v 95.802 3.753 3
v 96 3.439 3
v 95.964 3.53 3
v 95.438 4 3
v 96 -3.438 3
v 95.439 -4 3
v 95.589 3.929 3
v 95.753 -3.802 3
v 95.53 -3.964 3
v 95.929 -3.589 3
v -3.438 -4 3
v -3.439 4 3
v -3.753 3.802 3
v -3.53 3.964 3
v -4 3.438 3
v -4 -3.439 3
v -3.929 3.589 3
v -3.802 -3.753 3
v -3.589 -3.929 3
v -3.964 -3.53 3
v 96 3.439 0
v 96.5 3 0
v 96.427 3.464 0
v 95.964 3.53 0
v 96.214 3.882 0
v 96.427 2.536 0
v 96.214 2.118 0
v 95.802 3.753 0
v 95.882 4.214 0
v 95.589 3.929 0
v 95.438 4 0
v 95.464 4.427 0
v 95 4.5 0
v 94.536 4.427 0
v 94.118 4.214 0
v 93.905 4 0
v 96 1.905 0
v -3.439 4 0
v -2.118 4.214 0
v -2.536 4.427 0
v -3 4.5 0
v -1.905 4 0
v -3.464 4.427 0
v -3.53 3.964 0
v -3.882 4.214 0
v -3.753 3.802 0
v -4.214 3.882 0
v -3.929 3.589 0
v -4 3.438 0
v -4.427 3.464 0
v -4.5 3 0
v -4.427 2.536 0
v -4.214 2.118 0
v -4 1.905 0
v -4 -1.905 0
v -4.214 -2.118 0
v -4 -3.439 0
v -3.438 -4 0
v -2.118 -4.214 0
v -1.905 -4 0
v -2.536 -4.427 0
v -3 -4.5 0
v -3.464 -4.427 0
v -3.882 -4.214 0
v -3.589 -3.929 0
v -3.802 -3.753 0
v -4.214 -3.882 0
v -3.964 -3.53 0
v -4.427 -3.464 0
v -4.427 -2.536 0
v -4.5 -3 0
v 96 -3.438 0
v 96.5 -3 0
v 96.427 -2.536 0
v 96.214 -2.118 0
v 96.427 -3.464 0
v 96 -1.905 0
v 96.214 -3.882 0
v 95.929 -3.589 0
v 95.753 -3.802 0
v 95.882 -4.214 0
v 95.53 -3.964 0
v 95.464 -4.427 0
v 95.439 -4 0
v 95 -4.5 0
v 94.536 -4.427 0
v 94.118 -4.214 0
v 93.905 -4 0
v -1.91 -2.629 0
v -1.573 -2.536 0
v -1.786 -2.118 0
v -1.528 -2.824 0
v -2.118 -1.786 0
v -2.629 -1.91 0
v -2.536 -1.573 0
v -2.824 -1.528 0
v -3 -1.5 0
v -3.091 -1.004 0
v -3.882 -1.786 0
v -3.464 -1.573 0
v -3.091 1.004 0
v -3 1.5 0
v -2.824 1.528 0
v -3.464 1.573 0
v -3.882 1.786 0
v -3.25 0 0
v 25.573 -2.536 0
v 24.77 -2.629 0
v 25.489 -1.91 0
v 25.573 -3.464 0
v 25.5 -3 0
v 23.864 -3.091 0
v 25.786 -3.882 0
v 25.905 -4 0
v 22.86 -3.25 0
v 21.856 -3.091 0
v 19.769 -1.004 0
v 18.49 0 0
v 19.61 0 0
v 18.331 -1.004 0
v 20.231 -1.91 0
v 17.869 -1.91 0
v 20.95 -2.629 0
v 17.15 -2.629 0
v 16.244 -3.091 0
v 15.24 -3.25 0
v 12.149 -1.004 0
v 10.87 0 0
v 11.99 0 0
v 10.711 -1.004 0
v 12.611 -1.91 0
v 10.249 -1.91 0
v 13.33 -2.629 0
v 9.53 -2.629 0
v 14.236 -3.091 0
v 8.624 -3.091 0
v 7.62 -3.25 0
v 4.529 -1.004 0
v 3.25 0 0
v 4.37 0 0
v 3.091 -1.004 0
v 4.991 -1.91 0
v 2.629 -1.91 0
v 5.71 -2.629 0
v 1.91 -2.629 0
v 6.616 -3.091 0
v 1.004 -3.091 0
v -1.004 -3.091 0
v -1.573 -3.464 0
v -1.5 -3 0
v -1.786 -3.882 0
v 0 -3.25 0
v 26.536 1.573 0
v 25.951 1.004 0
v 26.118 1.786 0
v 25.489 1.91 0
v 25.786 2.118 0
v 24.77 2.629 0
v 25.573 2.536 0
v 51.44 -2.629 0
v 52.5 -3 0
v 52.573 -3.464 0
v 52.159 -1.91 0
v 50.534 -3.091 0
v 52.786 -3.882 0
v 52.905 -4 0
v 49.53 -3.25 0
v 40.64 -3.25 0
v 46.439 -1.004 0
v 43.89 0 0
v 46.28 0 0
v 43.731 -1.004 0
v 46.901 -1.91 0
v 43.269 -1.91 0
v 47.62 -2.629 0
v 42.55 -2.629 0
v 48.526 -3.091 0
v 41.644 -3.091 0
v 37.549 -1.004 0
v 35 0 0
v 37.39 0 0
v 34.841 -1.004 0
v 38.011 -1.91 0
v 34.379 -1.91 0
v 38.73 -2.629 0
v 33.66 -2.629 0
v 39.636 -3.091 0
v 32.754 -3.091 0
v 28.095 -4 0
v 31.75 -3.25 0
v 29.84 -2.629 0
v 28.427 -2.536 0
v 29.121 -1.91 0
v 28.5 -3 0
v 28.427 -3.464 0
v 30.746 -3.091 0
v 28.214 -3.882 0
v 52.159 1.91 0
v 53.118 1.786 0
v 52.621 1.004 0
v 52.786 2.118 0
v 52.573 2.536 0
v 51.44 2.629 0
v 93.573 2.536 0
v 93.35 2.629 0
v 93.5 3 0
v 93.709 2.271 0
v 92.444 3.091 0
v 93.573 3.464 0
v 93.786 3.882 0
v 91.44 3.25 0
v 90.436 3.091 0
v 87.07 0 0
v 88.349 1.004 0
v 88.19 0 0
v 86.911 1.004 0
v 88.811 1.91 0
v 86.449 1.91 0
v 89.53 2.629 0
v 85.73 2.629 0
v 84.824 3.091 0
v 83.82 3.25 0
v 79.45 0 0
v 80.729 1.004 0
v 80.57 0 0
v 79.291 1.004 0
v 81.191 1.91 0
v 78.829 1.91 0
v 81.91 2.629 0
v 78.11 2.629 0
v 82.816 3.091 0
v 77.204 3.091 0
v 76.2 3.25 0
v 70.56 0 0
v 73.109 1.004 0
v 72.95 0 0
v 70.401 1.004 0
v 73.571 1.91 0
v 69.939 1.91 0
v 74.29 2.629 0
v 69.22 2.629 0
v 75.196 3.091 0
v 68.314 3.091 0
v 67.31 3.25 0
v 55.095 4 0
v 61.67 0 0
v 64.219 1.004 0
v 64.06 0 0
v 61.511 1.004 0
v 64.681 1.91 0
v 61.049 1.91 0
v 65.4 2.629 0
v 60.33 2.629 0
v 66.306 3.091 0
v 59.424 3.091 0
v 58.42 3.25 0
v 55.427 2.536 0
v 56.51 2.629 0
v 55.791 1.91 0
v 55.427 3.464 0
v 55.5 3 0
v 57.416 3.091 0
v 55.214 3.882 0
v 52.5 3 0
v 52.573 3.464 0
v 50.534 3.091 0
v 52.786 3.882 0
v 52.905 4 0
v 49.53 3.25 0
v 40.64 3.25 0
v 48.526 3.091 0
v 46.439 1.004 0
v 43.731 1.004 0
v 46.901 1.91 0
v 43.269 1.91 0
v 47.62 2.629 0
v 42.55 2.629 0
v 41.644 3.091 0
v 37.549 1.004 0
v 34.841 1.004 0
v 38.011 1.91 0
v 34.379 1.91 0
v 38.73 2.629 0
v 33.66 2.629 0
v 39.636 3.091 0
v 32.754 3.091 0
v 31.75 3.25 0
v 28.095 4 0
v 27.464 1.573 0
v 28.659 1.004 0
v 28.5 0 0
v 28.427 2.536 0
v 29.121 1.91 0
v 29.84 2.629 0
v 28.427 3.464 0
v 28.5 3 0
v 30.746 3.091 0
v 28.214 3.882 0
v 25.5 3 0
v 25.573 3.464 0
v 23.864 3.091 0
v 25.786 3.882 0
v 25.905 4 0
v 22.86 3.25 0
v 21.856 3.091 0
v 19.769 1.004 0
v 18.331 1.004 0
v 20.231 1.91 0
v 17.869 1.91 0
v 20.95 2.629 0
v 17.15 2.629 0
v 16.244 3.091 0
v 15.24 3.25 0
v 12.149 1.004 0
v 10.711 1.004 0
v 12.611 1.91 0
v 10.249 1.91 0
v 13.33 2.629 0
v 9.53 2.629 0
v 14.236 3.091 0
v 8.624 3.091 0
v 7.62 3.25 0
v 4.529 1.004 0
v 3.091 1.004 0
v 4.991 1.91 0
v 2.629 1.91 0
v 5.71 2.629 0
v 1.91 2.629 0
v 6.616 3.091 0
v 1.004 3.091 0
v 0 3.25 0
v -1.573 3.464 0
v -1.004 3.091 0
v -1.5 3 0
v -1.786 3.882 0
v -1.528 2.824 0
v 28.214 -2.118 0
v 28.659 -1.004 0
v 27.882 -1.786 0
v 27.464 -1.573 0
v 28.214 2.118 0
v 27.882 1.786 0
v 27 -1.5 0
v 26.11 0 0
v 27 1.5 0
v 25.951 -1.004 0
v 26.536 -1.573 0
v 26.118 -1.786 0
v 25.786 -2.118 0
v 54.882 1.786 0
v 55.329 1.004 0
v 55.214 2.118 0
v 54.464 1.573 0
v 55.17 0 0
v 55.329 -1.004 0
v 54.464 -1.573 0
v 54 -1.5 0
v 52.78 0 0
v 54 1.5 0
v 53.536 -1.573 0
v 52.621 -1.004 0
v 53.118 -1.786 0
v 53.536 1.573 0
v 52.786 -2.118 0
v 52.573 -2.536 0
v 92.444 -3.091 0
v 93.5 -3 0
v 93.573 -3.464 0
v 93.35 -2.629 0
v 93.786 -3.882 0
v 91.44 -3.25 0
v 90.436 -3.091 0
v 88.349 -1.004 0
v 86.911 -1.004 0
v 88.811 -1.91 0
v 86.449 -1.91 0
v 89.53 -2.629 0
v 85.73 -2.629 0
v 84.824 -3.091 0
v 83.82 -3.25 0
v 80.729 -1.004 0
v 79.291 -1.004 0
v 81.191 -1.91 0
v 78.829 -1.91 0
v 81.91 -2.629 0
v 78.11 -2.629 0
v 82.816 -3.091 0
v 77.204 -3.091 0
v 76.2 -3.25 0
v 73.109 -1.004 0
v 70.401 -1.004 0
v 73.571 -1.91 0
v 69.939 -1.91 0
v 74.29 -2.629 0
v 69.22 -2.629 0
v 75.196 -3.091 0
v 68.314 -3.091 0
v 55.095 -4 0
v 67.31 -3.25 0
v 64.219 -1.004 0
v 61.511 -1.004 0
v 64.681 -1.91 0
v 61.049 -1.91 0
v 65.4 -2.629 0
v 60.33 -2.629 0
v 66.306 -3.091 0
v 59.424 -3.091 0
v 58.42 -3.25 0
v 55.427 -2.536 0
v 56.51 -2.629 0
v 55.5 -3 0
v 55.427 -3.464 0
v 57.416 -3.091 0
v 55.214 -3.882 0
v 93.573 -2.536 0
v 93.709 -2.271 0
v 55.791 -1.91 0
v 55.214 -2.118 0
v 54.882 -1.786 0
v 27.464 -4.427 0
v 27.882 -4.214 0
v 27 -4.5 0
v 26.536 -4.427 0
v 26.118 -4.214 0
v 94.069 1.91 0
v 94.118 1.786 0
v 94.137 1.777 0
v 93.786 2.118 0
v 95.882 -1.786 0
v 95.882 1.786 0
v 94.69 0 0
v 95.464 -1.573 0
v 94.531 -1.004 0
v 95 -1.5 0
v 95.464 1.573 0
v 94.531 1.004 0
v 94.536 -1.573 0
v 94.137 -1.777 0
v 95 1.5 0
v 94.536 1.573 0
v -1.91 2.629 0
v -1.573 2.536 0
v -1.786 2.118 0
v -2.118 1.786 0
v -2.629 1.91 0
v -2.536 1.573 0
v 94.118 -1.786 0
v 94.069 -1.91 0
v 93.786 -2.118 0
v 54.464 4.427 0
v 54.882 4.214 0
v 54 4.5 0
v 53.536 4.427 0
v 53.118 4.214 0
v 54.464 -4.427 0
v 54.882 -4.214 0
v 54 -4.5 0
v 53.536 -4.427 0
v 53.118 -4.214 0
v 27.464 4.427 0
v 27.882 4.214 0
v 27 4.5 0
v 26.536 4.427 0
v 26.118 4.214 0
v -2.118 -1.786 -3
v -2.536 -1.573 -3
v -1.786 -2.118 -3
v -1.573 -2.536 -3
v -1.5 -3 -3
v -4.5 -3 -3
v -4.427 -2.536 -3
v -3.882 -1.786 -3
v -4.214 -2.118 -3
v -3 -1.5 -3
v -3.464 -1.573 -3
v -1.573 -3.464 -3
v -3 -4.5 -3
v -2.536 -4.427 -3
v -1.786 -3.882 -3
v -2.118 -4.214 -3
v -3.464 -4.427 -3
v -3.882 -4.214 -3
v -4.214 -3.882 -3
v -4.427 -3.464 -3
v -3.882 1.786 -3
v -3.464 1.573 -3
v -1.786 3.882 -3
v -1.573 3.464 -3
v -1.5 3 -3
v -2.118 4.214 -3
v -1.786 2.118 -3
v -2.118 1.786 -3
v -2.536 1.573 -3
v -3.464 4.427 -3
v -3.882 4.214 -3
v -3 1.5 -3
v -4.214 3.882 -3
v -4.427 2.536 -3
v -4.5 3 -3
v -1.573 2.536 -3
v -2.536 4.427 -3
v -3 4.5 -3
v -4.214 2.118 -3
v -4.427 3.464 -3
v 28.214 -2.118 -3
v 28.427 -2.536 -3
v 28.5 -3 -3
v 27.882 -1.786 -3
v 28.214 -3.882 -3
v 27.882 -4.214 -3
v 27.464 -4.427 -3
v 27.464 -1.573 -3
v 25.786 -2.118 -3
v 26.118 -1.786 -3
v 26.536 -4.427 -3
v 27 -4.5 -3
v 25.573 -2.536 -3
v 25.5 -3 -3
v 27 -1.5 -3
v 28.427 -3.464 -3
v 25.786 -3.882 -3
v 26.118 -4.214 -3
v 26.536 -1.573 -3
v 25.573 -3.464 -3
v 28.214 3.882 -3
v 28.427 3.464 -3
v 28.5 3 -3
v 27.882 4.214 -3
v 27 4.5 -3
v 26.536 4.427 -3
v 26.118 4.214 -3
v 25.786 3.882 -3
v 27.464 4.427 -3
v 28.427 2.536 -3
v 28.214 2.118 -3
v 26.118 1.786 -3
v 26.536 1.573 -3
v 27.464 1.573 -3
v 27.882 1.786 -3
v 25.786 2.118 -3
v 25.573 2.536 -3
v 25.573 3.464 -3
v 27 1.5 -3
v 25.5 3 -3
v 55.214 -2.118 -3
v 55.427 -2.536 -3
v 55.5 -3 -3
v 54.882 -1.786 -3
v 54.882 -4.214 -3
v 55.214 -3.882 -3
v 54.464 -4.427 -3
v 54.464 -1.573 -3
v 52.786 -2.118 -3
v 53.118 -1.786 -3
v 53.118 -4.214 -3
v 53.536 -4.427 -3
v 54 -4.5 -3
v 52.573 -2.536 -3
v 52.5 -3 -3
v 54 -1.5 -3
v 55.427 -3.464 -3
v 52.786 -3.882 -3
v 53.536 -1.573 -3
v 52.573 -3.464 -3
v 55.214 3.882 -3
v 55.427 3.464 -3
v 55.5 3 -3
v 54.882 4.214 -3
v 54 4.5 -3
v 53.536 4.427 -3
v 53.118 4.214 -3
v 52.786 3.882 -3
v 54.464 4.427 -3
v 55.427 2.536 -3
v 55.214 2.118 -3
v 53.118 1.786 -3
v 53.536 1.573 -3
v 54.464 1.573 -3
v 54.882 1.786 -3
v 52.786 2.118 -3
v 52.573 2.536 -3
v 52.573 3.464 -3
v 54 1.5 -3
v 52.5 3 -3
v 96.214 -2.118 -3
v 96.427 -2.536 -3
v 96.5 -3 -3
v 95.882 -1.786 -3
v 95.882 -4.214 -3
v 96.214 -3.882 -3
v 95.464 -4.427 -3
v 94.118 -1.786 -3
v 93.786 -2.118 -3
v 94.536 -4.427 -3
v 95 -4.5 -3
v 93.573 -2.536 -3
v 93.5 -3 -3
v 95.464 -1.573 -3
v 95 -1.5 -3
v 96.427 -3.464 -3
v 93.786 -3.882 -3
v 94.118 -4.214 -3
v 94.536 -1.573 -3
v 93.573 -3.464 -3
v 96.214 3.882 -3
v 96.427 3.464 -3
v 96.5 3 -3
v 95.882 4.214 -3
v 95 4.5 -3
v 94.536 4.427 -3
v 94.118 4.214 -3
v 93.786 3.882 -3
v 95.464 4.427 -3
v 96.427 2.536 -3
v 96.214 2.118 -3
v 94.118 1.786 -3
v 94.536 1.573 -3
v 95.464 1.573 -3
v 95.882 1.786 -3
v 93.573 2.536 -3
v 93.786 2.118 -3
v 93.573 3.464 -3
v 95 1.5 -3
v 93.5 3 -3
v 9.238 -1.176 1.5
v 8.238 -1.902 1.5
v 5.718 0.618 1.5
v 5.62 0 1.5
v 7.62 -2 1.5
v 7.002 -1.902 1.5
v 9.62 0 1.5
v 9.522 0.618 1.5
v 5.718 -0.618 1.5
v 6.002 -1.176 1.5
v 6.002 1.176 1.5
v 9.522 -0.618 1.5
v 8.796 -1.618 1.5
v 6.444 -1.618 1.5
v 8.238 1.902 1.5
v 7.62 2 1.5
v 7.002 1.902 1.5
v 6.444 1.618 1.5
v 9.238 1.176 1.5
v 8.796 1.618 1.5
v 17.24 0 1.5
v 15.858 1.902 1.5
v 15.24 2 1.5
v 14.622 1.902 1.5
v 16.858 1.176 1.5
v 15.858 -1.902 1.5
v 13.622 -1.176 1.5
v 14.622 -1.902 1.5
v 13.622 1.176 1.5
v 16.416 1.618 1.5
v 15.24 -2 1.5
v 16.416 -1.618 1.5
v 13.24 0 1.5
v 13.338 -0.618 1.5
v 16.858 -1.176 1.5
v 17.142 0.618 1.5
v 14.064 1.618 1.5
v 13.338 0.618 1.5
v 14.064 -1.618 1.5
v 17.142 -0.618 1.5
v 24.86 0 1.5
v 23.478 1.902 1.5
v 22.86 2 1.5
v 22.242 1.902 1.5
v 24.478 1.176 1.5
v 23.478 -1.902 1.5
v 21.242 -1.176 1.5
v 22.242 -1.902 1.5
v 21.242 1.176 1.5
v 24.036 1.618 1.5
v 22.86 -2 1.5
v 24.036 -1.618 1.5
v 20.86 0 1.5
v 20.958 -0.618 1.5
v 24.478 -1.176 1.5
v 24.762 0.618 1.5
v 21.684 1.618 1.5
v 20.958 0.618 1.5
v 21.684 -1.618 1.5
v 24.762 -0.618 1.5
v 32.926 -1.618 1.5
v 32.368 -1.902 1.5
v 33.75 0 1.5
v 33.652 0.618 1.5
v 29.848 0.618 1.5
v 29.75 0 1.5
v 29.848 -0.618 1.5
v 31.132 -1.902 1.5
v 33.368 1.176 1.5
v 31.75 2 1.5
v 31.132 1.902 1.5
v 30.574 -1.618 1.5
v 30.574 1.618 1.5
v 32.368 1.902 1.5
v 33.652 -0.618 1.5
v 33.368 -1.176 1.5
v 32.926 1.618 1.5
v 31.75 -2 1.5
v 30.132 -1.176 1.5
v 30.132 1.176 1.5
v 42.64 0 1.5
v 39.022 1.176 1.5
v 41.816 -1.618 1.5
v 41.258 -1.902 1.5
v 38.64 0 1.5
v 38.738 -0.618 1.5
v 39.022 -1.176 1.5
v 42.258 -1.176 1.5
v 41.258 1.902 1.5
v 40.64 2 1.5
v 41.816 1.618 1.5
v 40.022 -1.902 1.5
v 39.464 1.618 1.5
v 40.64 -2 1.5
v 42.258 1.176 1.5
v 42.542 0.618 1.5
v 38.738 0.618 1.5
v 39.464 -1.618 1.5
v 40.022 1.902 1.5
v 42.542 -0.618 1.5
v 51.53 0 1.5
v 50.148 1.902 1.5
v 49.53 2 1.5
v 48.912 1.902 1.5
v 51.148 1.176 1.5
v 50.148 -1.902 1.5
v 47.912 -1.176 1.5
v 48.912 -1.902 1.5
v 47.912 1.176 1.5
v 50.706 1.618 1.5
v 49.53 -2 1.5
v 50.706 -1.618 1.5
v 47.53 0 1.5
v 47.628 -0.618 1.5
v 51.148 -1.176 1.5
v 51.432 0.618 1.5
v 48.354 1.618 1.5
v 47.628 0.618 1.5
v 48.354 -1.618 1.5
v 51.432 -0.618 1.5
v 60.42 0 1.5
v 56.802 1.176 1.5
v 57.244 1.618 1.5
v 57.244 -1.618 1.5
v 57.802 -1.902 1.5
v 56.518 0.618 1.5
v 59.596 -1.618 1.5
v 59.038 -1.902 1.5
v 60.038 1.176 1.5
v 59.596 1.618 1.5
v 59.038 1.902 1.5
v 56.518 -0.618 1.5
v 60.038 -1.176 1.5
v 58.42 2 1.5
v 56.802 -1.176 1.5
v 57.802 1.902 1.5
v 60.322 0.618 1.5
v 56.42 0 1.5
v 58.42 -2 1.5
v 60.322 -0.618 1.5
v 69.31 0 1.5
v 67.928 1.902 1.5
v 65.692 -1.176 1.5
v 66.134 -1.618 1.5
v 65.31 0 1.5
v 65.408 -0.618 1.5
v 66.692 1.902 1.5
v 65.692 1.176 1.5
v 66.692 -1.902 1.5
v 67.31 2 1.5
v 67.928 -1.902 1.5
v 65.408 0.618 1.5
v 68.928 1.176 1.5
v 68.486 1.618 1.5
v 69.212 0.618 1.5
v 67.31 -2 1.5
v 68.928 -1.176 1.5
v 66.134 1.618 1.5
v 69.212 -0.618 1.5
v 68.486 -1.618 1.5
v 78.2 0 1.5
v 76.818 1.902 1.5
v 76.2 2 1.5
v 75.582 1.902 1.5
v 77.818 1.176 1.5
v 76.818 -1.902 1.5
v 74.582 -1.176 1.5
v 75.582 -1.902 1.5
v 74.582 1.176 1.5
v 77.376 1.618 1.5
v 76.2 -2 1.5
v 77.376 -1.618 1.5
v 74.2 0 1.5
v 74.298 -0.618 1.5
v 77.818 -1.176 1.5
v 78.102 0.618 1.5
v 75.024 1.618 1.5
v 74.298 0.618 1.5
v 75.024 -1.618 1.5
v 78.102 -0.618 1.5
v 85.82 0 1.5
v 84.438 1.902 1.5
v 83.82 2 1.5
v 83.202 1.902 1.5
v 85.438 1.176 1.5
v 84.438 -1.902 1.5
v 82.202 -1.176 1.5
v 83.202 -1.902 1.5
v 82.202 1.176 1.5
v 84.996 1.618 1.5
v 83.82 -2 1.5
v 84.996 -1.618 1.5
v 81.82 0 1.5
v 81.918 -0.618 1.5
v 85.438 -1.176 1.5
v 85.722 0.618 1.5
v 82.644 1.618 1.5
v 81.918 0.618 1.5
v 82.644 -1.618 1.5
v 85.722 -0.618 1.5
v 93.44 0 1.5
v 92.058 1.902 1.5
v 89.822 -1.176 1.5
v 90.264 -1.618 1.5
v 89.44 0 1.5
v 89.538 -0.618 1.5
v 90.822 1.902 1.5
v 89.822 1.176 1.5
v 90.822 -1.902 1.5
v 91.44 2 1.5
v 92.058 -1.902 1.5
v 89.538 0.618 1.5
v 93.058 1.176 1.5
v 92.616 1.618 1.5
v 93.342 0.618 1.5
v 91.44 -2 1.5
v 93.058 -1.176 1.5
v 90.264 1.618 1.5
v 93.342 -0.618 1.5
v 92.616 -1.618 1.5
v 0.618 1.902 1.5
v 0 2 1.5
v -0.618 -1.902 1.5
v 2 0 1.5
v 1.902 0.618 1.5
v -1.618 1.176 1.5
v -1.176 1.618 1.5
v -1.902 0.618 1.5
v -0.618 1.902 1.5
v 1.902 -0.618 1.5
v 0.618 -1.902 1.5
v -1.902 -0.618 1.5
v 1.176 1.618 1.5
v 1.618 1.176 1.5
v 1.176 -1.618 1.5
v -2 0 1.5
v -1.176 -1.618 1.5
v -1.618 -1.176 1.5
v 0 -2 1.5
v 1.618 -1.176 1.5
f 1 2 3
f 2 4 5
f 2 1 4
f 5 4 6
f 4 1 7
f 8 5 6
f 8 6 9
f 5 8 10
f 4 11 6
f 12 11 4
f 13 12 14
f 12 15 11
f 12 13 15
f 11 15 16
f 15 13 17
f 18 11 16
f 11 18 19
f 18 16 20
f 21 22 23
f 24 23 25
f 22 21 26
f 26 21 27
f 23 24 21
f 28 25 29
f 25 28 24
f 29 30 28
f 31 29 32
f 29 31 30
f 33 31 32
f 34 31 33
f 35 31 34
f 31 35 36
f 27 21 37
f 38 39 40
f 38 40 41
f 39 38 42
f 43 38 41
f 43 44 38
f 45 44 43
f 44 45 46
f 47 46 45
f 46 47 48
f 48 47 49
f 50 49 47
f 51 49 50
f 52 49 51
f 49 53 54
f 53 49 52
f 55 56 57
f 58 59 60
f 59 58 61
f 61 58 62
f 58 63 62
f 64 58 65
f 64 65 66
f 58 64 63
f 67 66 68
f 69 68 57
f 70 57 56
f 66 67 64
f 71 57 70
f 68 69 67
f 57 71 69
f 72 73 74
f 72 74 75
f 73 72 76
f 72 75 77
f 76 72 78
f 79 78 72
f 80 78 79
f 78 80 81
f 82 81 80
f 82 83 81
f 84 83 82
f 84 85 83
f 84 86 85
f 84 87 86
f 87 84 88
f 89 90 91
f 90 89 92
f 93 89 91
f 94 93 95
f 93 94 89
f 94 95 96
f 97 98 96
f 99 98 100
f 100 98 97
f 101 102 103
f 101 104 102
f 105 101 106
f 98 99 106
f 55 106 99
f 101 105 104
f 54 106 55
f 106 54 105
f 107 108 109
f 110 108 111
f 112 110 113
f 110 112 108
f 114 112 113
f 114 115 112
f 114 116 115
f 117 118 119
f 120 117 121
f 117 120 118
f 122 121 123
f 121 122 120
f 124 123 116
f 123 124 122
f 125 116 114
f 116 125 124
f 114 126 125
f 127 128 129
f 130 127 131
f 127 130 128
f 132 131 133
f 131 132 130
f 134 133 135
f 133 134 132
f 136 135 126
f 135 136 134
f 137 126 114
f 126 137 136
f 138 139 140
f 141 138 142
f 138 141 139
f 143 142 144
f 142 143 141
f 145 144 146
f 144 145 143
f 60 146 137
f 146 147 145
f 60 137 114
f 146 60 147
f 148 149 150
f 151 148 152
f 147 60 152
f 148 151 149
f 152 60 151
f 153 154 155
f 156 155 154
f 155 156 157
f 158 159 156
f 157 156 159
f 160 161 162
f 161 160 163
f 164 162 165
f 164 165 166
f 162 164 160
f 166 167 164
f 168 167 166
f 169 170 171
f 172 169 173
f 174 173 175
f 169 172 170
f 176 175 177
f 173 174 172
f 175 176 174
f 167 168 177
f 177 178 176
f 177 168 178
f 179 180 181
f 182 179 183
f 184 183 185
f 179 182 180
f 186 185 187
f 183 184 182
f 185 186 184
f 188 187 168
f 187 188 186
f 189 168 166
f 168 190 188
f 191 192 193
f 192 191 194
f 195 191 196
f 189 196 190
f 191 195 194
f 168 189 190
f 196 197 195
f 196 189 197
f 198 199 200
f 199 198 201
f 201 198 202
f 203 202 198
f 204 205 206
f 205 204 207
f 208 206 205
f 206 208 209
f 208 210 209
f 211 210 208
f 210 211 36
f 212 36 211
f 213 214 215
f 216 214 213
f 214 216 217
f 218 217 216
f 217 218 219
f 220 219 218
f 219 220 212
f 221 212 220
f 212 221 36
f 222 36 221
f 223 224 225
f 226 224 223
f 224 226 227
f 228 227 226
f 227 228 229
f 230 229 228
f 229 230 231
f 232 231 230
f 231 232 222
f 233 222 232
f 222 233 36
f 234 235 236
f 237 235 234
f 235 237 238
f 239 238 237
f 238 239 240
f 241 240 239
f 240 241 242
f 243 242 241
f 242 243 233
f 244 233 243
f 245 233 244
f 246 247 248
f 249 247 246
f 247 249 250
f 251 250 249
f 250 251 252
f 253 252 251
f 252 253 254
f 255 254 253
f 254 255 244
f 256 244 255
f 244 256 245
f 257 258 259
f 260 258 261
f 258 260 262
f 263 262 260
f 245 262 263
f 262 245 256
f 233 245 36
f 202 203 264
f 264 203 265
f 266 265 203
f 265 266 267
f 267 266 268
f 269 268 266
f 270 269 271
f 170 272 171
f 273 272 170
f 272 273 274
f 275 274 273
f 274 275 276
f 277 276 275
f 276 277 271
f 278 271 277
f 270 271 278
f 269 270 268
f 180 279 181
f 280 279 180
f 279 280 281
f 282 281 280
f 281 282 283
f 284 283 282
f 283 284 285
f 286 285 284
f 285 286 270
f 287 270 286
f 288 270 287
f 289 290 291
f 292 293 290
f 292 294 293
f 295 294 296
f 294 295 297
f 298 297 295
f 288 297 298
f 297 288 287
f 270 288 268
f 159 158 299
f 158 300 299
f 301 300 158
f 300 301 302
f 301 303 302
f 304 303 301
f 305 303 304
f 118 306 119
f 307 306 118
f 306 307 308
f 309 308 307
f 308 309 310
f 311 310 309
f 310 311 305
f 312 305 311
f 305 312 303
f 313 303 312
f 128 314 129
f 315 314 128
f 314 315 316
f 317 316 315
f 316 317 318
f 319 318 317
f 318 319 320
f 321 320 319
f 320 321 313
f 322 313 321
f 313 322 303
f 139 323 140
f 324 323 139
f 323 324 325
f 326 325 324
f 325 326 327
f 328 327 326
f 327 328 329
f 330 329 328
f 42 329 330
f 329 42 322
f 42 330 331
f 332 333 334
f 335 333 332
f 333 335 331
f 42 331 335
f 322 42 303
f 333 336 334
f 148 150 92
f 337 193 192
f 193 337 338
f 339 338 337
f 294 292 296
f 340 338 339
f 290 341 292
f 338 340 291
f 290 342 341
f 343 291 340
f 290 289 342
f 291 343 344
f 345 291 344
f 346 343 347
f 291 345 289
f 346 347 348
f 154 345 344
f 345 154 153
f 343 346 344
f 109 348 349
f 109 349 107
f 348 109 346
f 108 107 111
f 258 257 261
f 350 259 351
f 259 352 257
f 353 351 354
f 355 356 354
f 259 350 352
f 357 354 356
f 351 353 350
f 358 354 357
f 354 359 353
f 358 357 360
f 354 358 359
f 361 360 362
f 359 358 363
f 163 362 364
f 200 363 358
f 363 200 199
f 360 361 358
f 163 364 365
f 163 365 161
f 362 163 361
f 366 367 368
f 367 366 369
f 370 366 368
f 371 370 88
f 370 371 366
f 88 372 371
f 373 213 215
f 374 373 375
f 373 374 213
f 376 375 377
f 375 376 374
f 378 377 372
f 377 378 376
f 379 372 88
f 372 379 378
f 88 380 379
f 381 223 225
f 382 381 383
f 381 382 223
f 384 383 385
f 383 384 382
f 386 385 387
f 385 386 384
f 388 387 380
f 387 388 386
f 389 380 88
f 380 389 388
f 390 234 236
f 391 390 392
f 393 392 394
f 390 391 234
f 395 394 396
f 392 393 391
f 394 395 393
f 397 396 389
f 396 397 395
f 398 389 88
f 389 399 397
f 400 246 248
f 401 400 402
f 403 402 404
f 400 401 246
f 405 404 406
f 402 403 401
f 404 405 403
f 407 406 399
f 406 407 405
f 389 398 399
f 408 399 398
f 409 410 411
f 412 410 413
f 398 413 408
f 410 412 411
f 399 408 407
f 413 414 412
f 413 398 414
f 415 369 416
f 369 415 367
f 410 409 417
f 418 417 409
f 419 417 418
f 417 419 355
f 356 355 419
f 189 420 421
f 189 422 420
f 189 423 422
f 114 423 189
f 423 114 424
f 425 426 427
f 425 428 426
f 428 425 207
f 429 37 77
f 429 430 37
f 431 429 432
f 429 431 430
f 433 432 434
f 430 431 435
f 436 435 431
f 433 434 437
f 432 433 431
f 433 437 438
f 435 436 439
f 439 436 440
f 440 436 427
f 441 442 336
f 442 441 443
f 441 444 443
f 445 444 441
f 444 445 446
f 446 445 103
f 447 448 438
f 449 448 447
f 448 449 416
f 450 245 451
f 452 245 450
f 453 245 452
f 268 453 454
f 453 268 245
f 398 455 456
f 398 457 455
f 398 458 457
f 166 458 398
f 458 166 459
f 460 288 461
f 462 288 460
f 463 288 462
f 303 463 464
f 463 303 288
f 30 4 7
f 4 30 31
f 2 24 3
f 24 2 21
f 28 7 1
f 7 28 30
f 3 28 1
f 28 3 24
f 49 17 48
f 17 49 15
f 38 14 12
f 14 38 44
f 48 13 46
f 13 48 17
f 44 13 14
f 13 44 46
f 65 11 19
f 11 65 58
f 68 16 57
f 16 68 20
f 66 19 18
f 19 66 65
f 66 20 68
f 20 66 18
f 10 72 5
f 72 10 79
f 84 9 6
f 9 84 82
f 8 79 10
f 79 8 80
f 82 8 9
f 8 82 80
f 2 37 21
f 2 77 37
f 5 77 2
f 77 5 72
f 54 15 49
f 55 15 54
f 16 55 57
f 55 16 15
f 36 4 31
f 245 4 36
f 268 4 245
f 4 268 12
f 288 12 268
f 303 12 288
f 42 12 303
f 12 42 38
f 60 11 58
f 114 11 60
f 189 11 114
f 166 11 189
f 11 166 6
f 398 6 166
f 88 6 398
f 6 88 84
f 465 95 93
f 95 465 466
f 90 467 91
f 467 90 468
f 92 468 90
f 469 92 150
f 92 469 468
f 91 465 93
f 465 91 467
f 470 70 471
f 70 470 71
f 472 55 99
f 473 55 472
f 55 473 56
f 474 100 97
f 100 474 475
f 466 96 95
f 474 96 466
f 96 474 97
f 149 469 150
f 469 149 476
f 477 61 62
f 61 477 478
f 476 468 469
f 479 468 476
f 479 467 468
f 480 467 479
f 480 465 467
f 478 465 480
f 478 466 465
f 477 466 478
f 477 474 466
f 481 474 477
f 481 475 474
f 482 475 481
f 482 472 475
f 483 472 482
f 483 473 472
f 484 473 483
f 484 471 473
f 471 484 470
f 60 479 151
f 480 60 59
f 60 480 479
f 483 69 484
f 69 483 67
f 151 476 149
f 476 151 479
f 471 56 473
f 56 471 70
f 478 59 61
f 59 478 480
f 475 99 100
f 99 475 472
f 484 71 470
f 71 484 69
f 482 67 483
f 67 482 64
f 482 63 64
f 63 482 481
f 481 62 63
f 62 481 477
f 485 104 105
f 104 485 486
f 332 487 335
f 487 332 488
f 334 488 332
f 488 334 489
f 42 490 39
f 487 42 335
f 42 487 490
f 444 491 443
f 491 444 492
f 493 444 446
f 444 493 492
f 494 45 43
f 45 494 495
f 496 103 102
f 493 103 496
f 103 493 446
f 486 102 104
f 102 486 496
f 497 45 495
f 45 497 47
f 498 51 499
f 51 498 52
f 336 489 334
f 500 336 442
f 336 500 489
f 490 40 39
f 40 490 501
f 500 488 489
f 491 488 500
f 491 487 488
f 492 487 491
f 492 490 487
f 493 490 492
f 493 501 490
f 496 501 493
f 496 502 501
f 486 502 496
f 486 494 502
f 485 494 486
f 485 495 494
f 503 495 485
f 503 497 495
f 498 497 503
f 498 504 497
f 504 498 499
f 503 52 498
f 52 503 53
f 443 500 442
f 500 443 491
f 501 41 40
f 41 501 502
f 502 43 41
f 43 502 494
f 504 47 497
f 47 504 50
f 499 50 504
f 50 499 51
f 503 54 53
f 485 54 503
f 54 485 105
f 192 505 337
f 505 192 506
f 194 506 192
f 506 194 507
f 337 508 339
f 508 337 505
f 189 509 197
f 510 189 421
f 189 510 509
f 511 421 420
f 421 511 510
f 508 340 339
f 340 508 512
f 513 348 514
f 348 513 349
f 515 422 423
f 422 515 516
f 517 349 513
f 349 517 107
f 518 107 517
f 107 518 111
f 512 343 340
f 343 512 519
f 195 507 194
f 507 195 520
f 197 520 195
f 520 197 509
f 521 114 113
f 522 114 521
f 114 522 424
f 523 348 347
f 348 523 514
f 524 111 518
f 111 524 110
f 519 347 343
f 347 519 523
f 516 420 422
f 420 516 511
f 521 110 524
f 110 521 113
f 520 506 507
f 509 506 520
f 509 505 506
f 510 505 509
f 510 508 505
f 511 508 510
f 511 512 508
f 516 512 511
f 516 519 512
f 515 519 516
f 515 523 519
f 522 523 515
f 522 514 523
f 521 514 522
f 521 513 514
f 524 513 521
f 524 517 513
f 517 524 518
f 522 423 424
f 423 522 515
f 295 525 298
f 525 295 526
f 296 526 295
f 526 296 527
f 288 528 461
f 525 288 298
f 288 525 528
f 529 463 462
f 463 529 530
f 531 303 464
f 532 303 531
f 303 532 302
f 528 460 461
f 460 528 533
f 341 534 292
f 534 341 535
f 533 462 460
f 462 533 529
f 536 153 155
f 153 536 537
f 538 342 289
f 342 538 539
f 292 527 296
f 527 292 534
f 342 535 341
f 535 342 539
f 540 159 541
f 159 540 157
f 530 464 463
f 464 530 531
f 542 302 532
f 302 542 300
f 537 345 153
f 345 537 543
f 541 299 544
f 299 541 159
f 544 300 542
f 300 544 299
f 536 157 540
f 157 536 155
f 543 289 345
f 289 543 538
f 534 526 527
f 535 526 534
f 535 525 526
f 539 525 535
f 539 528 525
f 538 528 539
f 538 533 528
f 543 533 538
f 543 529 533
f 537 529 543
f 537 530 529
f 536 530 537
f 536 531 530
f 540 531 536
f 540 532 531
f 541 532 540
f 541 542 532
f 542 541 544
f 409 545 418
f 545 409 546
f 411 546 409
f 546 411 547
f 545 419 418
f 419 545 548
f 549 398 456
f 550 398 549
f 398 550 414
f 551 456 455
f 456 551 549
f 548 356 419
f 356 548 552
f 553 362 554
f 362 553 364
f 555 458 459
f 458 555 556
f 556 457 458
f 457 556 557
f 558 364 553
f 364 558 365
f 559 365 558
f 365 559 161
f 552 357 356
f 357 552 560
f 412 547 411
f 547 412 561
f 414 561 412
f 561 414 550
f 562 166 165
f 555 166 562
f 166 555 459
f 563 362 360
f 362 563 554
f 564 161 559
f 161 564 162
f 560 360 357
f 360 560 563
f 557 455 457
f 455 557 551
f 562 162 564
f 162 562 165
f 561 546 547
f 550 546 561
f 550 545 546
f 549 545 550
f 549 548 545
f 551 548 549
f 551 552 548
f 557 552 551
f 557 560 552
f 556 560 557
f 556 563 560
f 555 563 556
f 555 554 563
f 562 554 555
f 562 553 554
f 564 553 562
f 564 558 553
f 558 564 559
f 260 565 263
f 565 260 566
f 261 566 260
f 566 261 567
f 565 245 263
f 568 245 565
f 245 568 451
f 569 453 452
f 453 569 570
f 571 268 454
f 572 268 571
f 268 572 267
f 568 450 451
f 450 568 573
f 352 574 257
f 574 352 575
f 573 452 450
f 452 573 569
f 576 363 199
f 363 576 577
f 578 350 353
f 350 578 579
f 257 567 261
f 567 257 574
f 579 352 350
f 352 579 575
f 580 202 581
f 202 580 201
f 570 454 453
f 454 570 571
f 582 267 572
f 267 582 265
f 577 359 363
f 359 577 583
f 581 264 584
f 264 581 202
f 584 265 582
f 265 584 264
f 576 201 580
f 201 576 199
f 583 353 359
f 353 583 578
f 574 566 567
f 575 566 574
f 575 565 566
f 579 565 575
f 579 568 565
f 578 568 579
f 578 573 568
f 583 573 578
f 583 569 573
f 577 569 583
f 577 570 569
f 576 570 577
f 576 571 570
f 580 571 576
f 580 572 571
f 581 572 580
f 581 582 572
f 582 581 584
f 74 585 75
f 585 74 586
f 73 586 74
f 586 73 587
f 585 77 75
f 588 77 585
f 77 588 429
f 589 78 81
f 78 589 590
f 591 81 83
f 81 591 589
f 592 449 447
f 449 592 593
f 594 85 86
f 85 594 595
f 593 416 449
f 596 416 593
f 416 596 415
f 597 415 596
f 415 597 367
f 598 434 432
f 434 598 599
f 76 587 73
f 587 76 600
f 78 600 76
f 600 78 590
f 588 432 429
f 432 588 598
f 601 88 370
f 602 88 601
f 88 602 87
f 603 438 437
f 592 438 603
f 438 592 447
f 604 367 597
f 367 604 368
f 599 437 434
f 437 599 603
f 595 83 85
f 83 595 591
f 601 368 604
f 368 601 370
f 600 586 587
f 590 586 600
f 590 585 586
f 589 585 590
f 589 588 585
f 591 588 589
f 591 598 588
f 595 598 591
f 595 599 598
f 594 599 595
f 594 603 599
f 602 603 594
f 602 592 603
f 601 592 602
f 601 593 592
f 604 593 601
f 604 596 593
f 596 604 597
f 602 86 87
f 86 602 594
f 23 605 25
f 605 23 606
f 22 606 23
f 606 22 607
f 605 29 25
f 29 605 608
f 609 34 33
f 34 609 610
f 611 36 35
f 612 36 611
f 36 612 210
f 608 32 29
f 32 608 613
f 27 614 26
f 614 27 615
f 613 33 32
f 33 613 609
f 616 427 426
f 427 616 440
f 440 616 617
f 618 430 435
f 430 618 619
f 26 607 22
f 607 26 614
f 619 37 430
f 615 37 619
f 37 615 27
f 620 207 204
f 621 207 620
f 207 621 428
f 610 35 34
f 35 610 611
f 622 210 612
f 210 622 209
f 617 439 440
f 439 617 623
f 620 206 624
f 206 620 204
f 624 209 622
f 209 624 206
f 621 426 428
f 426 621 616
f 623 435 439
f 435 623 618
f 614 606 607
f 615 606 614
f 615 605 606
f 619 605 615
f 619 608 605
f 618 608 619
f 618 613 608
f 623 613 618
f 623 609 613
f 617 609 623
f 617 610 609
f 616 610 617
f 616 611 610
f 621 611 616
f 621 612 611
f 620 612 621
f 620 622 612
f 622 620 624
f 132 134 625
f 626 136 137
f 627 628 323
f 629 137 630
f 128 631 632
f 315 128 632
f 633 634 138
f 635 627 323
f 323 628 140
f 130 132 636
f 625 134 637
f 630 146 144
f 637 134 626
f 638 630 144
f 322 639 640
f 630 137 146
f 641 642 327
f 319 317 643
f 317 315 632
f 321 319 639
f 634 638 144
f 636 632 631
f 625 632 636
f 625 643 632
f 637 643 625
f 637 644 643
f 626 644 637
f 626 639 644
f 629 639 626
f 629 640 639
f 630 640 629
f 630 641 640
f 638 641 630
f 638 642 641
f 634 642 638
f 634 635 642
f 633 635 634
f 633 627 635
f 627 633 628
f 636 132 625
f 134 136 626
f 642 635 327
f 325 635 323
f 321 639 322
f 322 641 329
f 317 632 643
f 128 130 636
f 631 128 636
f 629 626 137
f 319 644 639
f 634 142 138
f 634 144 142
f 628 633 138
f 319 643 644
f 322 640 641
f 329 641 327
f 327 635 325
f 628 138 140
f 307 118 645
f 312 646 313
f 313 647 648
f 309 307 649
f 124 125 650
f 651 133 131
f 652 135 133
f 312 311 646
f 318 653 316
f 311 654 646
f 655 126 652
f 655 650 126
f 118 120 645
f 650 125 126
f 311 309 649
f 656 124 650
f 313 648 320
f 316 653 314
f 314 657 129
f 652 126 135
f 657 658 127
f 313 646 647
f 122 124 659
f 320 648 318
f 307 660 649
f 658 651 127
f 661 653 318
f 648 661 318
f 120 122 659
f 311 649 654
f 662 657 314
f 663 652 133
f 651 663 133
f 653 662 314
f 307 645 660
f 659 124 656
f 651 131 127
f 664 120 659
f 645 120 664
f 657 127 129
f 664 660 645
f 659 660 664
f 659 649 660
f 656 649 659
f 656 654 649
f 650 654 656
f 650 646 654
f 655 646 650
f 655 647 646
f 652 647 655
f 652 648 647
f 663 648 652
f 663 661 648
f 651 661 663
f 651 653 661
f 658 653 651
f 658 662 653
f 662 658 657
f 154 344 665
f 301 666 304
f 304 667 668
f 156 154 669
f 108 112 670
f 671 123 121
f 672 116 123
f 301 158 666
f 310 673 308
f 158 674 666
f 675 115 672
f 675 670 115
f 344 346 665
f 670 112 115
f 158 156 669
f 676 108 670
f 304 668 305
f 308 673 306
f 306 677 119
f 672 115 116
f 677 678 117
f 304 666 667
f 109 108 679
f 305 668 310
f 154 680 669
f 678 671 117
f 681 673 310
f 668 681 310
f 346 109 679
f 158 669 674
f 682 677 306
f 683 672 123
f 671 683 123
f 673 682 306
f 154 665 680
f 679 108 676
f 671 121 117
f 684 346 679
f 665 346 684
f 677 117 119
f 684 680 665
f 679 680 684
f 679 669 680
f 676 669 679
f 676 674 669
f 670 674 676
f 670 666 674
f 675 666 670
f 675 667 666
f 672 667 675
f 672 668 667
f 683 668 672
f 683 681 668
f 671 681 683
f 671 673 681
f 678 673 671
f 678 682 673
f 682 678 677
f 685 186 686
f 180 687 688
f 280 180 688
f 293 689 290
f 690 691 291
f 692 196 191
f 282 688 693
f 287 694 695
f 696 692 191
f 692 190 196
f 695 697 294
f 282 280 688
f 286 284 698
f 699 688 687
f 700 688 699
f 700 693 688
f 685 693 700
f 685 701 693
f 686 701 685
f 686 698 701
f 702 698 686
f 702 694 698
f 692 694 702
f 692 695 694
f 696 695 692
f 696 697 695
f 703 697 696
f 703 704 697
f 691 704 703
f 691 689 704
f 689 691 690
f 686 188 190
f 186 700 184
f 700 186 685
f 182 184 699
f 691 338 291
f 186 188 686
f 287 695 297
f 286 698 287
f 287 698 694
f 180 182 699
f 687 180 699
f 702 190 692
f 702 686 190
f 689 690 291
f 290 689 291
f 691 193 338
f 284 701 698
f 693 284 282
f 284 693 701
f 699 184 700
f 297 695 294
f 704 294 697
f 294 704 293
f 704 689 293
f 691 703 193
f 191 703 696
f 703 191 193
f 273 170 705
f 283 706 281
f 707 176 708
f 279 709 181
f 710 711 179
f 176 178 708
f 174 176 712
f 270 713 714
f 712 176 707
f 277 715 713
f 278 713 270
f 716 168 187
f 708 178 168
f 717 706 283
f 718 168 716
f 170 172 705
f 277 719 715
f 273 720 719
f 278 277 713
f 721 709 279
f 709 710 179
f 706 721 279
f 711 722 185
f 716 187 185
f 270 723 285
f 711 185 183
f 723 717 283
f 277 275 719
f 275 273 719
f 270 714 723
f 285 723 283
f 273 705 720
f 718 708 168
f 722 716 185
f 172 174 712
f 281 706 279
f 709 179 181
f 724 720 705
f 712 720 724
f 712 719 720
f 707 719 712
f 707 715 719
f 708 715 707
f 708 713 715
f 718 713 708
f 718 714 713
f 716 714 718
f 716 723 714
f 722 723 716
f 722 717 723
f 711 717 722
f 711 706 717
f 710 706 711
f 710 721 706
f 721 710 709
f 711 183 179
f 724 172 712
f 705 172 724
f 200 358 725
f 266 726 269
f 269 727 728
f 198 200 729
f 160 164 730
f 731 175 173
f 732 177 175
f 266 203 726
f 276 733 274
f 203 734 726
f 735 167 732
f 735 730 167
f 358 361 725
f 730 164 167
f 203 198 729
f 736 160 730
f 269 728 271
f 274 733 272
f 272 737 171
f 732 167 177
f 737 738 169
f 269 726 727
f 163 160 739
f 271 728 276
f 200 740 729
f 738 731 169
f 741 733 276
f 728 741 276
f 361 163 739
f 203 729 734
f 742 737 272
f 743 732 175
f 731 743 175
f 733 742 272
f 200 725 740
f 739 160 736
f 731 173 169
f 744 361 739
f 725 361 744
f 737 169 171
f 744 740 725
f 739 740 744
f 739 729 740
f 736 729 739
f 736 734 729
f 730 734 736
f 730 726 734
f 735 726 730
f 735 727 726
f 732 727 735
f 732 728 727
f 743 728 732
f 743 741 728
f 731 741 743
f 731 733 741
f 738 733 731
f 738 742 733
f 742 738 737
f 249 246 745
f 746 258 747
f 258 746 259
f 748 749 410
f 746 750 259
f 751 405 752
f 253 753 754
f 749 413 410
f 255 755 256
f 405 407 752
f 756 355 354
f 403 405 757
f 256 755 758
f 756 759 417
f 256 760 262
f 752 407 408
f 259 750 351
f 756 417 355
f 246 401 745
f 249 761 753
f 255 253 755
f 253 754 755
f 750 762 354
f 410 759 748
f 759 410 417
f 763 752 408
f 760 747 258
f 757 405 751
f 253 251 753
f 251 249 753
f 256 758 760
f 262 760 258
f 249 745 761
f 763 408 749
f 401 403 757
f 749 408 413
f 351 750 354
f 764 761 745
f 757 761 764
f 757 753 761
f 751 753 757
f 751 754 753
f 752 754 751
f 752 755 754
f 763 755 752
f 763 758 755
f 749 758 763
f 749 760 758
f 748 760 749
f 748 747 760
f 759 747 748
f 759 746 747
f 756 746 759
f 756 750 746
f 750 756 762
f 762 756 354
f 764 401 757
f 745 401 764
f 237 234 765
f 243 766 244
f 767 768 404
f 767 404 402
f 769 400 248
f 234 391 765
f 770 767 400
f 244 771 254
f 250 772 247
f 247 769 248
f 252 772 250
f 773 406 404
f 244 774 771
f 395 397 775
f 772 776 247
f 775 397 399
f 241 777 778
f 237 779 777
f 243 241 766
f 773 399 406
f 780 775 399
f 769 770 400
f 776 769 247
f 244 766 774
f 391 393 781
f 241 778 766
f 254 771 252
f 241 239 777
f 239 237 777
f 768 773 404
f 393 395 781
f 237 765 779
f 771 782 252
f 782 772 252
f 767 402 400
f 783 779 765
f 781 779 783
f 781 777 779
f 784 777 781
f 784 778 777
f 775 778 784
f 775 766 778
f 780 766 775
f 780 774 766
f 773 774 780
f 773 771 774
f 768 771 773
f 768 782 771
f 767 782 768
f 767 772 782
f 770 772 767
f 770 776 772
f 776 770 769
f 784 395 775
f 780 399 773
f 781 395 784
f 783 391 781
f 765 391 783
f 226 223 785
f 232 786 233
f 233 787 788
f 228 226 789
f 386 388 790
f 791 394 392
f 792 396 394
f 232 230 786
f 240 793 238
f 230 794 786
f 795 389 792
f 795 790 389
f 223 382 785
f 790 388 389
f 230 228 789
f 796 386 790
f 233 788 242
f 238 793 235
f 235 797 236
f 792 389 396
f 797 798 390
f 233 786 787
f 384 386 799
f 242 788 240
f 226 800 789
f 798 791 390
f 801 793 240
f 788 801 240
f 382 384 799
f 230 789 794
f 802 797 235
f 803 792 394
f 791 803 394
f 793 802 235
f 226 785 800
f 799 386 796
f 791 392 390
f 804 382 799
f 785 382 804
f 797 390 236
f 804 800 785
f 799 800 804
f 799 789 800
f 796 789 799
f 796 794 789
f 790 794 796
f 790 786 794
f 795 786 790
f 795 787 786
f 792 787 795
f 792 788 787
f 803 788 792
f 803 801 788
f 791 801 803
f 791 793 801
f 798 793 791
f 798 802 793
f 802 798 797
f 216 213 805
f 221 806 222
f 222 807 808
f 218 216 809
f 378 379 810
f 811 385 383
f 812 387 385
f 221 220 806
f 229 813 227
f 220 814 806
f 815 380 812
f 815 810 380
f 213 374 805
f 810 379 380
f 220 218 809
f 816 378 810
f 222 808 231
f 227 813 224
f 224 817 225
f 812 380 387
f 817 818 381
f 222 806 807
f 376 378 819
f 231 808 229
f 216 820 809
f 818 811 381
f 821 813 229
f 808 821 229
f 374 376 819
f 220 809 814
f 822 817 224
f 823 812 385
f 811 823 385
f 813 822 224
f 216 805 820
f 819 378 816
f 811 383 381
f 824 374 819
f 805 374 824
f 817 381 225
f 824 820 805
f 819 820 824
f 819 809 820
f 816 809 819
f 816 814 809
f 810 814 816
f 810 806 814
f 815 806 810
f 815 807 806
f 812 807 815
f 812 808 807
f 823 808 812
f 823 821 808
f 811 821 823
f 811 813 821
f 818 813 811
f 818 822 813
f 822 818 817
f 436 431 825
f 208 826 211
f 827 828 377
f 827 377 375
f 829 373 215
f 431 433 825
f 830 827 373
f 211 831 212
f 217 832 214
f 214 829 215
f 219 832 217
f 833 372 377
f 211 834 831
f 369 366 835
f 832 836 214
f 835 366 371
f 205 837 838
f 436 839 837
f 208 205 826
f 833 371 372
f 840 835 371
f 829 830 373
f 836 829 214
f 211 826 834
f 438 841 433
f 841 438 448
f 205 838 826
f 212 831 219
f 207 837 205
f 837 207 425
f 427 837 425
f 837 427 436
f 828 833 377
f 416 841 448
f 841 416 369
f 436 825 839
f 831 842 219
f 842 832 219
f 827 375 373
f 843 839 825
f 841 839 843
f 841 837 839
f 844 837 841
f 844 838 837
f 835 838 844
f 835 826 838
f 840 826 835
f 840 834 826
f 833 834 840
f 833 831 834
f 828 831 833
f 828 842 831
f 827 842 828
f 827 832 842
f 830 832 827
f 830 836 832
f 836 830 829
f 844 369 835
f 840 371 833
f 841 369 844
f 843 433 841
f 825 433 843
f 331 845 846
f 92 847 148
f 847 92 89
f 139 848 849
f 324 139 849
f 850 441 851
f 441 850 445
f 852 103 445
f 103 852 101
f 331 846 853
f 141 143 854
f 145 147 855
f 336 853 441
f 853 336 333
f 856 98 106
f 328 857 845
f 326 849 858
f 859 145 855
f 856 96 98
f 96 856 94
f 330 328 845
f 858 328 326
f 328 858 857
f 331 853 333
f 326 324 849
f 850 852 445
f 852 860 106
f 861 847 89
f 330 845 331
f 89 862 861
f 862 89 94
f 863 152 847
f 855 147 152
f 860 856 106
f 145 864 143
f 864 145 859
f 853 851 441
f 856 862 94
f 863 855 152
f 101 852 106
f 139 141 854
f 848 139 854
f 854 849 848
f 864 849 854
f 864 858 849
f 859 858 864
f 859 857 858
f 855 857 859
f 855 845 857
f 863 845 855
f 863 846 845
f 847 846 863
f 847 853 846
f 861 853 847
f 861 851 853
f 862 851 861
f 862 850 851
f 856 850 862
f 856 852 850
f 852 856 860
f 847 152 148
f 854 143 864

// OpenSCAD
// file: roundCornersCube.scad
/*
http://codeviewer.org/view/code:1b36 
Copyright (C) 2011 Sergio Vilches
This program is free software: you can redistribute it and/or modify it under the terms of the GNU General Public License as published by the Free Software Foundation, either version 3 of the License, or (at your option) any later version.
This program is distributed in the hope that it will be useful, but WITHOUT ANY WARRANTY; without even the implied warranty of MERCHANTABILITY or FITNESS FOR A PARTICULAR PURPOSE. See the GNU General Public License for more details. You should have received a copy of the GNU General Public License along with this program. If not, see <http://www.gnu.org/licenses/>.
Contact: s.vilches.e@gmail.com


    ----------------------------------------------------------- 
                 Round Corners Cube (Extruded)                
      roundCornersCube(x,y,z,r) Where:                        
         - x = Xdir width                                     
         - y = Ydir width                                     
         - z = Height of the cube                             
         - r = Rounding radious                               
                                                              
      Example: roundCornerCube(10,10,2,1);                    
     *Some times it's needed to use F6 to see good results!   
 	 ----------------------------------------------------------- 
*/
// Test it!
// roundCornersCube(10,5,2,1);


module createMeniscus(h,radius) // This module creates the shape that needs to be substracted from a cube to make its corners rounded.
difference(){        //This shape is basicly the difference between a quarter of cylinder and a cube
   translate([radius/2+0.1,radius/2+0.1,0]){
      cube([radius+0.2,radius+0.1,h+0.2],center=true);         // All that 0.x numbers are to avoid "ghost boundaries" when substracting
   }

   cylinder(h=h+0.2,r=radius,$fn = 25,center=true);
}


module roundCornersCube(x,y,z,r)  // Now we just substract the shape we have created in the four corners
difference(){
   cube([x,y,z], center=true);

translate([x/2-r,y/2-r]){  // We move to the first corner (x,y)
      rotate(0){  
         createMeniscus(z,r); // And substract the meniscus
      }
   }
   translate([-x/2+r,y/2-r]){ // To the second corner (-x,y)
      rotate(90){
         createMeniscus(z,r); // But this time we have to rotate the meniscus 90 deg
      }
   }
      translate([-x/2+r,-y/2+r]){ // ... 
      rotate(180){
         createMeniscus(z,r);
      }
   }
      translate([x/2-r,-y/2+r]){
      rotate(270){
         createMeniscus(z,r);
      }
   }
}

module createSubtractor(h,radius) //Create the shape that needs to be substracted from a cube
difference(){ cube([radius+0.1,radius+0.1,h]); cylinder(h=h,r=radius+0.1,$fn = 25); } //+0.1 stops ghost edges

module rCube(x,y,z,r)//Create a cube and subtract the 4 corners
difference(){
cube([x,y,z]);
translate([x-r,y-r]) rotate(0) createSubtractor(z,r); 
translate([r,y-r]) rotate(90) createSubtractor(z,r);
translate([r,r]) rotate(180) createSubtractor(z,r);
translate([x-r,r]) rotate(270) createSubtractor(z,r);
}
// main file
$fn = 20;


include <roundCornersCube.scad>
x = [7.62, 7.62, 15.24, 22.86,31.75, 40.64, 49.53, 58.42, 67.31, 76.2, 83.82,91.44];

module dome(d=5, h=.7)
{
  c = d;
  R = h/2+c*c/(8*h);
  difference()
  {
  translate([0,0,-R+h])
  sphere(r=R);
  translate([-R*2,-R*2,-R*2])
  cube([R*4,R*4,R*2]);
  }
  
}

module dome_hole()
{
difference()
{
dome(h=.7+1, d=5+2);

dome(h=.7, d=5);

}

}

module dome_bool()
{

//dome(h=.6, d=5);
cylinder(d1=6.5, d2=4, h=1.5);
}


module domes()
{
for(i=[0:12])
{
  translate([x[i],0,0])
  dome_hole();

}
}

module dome_bools()
{
for(i=[0:12])
{
  translate([x[i],0,0])
  dome_bool();

}

}

module wholeshit()
{
union()
{
translate([0,0,0])
difference()
{
union()
{
translate([-4, -4, 0])
rCube(10*10,8,2+1,1);

//sprues
color("blue")
{
translate([-3, -3, -3])
cylinder(d=3, h=3);


translate([-3, 3, -3])

cylinder(d=3, h=3);

translate([-3+30, -3, -3])
cylinder(d=3, h=3);


translate([-3+30, 3, -3])
cylinder(d=3, h=3);


translate([-3+57, -3, -3])
cylinder(d=3, h=3);


translate([-3+57, 3, -3])
cylinder(d=3, h=3);


translate([-3+98, -3, -3])
cylinder(d=3, h=3);


translate([-3+98, 3, -3])
cylinder(d=3, h=3);
}

//domes();
}
//translate([0,0,50])
translate([0,0,0])
dome_bools();
}
}
}
/*
difference()
{
translate([-8,-7.5,-3.2])
cube([110, 15, 5.19+1]);

wholeshit();

//screw holes
color("red")
translate([0,0,-4])
{
translate([-6,5.5,0])
cylinder(d=2, h=30);

translate([-6,-5.5,0])
cylinder(d=2, h=30);


translate([-6+50,5.5,0])
cylinder(d=2, h=30);

translate([-6+50,-5.5,0])
cylinder(d=2, h=30);

translate([-6+105,5.5,0])
cylinder(d=2, h=30);

translate([-6+105,-5.5,0])
cylinder(d=2, h=30);
}
}



translate([0,30,0])
{
difference()
{
translate([-8,-7.5,-3.2])
cube([110, 15, 2]);

translate([0,0,-4])
{
translate([-6,5.5,0])
cylinder(d=2, h=30);

translate([-6,-5.5,0])
cylinder(d=2, h=30);


translate([-6+50,5.5,0])
cylinder(d=2, h=30);

translate([-6+50,-5.5,0])
cylinder(d=2, h=30);

translate([-6+105,5.5,0])
cylinder(d=2, h=30);

translate([-6+105,-5.5,0])
cylinder(d=2, h=30);
}
}
}
*/

wholeshit();
